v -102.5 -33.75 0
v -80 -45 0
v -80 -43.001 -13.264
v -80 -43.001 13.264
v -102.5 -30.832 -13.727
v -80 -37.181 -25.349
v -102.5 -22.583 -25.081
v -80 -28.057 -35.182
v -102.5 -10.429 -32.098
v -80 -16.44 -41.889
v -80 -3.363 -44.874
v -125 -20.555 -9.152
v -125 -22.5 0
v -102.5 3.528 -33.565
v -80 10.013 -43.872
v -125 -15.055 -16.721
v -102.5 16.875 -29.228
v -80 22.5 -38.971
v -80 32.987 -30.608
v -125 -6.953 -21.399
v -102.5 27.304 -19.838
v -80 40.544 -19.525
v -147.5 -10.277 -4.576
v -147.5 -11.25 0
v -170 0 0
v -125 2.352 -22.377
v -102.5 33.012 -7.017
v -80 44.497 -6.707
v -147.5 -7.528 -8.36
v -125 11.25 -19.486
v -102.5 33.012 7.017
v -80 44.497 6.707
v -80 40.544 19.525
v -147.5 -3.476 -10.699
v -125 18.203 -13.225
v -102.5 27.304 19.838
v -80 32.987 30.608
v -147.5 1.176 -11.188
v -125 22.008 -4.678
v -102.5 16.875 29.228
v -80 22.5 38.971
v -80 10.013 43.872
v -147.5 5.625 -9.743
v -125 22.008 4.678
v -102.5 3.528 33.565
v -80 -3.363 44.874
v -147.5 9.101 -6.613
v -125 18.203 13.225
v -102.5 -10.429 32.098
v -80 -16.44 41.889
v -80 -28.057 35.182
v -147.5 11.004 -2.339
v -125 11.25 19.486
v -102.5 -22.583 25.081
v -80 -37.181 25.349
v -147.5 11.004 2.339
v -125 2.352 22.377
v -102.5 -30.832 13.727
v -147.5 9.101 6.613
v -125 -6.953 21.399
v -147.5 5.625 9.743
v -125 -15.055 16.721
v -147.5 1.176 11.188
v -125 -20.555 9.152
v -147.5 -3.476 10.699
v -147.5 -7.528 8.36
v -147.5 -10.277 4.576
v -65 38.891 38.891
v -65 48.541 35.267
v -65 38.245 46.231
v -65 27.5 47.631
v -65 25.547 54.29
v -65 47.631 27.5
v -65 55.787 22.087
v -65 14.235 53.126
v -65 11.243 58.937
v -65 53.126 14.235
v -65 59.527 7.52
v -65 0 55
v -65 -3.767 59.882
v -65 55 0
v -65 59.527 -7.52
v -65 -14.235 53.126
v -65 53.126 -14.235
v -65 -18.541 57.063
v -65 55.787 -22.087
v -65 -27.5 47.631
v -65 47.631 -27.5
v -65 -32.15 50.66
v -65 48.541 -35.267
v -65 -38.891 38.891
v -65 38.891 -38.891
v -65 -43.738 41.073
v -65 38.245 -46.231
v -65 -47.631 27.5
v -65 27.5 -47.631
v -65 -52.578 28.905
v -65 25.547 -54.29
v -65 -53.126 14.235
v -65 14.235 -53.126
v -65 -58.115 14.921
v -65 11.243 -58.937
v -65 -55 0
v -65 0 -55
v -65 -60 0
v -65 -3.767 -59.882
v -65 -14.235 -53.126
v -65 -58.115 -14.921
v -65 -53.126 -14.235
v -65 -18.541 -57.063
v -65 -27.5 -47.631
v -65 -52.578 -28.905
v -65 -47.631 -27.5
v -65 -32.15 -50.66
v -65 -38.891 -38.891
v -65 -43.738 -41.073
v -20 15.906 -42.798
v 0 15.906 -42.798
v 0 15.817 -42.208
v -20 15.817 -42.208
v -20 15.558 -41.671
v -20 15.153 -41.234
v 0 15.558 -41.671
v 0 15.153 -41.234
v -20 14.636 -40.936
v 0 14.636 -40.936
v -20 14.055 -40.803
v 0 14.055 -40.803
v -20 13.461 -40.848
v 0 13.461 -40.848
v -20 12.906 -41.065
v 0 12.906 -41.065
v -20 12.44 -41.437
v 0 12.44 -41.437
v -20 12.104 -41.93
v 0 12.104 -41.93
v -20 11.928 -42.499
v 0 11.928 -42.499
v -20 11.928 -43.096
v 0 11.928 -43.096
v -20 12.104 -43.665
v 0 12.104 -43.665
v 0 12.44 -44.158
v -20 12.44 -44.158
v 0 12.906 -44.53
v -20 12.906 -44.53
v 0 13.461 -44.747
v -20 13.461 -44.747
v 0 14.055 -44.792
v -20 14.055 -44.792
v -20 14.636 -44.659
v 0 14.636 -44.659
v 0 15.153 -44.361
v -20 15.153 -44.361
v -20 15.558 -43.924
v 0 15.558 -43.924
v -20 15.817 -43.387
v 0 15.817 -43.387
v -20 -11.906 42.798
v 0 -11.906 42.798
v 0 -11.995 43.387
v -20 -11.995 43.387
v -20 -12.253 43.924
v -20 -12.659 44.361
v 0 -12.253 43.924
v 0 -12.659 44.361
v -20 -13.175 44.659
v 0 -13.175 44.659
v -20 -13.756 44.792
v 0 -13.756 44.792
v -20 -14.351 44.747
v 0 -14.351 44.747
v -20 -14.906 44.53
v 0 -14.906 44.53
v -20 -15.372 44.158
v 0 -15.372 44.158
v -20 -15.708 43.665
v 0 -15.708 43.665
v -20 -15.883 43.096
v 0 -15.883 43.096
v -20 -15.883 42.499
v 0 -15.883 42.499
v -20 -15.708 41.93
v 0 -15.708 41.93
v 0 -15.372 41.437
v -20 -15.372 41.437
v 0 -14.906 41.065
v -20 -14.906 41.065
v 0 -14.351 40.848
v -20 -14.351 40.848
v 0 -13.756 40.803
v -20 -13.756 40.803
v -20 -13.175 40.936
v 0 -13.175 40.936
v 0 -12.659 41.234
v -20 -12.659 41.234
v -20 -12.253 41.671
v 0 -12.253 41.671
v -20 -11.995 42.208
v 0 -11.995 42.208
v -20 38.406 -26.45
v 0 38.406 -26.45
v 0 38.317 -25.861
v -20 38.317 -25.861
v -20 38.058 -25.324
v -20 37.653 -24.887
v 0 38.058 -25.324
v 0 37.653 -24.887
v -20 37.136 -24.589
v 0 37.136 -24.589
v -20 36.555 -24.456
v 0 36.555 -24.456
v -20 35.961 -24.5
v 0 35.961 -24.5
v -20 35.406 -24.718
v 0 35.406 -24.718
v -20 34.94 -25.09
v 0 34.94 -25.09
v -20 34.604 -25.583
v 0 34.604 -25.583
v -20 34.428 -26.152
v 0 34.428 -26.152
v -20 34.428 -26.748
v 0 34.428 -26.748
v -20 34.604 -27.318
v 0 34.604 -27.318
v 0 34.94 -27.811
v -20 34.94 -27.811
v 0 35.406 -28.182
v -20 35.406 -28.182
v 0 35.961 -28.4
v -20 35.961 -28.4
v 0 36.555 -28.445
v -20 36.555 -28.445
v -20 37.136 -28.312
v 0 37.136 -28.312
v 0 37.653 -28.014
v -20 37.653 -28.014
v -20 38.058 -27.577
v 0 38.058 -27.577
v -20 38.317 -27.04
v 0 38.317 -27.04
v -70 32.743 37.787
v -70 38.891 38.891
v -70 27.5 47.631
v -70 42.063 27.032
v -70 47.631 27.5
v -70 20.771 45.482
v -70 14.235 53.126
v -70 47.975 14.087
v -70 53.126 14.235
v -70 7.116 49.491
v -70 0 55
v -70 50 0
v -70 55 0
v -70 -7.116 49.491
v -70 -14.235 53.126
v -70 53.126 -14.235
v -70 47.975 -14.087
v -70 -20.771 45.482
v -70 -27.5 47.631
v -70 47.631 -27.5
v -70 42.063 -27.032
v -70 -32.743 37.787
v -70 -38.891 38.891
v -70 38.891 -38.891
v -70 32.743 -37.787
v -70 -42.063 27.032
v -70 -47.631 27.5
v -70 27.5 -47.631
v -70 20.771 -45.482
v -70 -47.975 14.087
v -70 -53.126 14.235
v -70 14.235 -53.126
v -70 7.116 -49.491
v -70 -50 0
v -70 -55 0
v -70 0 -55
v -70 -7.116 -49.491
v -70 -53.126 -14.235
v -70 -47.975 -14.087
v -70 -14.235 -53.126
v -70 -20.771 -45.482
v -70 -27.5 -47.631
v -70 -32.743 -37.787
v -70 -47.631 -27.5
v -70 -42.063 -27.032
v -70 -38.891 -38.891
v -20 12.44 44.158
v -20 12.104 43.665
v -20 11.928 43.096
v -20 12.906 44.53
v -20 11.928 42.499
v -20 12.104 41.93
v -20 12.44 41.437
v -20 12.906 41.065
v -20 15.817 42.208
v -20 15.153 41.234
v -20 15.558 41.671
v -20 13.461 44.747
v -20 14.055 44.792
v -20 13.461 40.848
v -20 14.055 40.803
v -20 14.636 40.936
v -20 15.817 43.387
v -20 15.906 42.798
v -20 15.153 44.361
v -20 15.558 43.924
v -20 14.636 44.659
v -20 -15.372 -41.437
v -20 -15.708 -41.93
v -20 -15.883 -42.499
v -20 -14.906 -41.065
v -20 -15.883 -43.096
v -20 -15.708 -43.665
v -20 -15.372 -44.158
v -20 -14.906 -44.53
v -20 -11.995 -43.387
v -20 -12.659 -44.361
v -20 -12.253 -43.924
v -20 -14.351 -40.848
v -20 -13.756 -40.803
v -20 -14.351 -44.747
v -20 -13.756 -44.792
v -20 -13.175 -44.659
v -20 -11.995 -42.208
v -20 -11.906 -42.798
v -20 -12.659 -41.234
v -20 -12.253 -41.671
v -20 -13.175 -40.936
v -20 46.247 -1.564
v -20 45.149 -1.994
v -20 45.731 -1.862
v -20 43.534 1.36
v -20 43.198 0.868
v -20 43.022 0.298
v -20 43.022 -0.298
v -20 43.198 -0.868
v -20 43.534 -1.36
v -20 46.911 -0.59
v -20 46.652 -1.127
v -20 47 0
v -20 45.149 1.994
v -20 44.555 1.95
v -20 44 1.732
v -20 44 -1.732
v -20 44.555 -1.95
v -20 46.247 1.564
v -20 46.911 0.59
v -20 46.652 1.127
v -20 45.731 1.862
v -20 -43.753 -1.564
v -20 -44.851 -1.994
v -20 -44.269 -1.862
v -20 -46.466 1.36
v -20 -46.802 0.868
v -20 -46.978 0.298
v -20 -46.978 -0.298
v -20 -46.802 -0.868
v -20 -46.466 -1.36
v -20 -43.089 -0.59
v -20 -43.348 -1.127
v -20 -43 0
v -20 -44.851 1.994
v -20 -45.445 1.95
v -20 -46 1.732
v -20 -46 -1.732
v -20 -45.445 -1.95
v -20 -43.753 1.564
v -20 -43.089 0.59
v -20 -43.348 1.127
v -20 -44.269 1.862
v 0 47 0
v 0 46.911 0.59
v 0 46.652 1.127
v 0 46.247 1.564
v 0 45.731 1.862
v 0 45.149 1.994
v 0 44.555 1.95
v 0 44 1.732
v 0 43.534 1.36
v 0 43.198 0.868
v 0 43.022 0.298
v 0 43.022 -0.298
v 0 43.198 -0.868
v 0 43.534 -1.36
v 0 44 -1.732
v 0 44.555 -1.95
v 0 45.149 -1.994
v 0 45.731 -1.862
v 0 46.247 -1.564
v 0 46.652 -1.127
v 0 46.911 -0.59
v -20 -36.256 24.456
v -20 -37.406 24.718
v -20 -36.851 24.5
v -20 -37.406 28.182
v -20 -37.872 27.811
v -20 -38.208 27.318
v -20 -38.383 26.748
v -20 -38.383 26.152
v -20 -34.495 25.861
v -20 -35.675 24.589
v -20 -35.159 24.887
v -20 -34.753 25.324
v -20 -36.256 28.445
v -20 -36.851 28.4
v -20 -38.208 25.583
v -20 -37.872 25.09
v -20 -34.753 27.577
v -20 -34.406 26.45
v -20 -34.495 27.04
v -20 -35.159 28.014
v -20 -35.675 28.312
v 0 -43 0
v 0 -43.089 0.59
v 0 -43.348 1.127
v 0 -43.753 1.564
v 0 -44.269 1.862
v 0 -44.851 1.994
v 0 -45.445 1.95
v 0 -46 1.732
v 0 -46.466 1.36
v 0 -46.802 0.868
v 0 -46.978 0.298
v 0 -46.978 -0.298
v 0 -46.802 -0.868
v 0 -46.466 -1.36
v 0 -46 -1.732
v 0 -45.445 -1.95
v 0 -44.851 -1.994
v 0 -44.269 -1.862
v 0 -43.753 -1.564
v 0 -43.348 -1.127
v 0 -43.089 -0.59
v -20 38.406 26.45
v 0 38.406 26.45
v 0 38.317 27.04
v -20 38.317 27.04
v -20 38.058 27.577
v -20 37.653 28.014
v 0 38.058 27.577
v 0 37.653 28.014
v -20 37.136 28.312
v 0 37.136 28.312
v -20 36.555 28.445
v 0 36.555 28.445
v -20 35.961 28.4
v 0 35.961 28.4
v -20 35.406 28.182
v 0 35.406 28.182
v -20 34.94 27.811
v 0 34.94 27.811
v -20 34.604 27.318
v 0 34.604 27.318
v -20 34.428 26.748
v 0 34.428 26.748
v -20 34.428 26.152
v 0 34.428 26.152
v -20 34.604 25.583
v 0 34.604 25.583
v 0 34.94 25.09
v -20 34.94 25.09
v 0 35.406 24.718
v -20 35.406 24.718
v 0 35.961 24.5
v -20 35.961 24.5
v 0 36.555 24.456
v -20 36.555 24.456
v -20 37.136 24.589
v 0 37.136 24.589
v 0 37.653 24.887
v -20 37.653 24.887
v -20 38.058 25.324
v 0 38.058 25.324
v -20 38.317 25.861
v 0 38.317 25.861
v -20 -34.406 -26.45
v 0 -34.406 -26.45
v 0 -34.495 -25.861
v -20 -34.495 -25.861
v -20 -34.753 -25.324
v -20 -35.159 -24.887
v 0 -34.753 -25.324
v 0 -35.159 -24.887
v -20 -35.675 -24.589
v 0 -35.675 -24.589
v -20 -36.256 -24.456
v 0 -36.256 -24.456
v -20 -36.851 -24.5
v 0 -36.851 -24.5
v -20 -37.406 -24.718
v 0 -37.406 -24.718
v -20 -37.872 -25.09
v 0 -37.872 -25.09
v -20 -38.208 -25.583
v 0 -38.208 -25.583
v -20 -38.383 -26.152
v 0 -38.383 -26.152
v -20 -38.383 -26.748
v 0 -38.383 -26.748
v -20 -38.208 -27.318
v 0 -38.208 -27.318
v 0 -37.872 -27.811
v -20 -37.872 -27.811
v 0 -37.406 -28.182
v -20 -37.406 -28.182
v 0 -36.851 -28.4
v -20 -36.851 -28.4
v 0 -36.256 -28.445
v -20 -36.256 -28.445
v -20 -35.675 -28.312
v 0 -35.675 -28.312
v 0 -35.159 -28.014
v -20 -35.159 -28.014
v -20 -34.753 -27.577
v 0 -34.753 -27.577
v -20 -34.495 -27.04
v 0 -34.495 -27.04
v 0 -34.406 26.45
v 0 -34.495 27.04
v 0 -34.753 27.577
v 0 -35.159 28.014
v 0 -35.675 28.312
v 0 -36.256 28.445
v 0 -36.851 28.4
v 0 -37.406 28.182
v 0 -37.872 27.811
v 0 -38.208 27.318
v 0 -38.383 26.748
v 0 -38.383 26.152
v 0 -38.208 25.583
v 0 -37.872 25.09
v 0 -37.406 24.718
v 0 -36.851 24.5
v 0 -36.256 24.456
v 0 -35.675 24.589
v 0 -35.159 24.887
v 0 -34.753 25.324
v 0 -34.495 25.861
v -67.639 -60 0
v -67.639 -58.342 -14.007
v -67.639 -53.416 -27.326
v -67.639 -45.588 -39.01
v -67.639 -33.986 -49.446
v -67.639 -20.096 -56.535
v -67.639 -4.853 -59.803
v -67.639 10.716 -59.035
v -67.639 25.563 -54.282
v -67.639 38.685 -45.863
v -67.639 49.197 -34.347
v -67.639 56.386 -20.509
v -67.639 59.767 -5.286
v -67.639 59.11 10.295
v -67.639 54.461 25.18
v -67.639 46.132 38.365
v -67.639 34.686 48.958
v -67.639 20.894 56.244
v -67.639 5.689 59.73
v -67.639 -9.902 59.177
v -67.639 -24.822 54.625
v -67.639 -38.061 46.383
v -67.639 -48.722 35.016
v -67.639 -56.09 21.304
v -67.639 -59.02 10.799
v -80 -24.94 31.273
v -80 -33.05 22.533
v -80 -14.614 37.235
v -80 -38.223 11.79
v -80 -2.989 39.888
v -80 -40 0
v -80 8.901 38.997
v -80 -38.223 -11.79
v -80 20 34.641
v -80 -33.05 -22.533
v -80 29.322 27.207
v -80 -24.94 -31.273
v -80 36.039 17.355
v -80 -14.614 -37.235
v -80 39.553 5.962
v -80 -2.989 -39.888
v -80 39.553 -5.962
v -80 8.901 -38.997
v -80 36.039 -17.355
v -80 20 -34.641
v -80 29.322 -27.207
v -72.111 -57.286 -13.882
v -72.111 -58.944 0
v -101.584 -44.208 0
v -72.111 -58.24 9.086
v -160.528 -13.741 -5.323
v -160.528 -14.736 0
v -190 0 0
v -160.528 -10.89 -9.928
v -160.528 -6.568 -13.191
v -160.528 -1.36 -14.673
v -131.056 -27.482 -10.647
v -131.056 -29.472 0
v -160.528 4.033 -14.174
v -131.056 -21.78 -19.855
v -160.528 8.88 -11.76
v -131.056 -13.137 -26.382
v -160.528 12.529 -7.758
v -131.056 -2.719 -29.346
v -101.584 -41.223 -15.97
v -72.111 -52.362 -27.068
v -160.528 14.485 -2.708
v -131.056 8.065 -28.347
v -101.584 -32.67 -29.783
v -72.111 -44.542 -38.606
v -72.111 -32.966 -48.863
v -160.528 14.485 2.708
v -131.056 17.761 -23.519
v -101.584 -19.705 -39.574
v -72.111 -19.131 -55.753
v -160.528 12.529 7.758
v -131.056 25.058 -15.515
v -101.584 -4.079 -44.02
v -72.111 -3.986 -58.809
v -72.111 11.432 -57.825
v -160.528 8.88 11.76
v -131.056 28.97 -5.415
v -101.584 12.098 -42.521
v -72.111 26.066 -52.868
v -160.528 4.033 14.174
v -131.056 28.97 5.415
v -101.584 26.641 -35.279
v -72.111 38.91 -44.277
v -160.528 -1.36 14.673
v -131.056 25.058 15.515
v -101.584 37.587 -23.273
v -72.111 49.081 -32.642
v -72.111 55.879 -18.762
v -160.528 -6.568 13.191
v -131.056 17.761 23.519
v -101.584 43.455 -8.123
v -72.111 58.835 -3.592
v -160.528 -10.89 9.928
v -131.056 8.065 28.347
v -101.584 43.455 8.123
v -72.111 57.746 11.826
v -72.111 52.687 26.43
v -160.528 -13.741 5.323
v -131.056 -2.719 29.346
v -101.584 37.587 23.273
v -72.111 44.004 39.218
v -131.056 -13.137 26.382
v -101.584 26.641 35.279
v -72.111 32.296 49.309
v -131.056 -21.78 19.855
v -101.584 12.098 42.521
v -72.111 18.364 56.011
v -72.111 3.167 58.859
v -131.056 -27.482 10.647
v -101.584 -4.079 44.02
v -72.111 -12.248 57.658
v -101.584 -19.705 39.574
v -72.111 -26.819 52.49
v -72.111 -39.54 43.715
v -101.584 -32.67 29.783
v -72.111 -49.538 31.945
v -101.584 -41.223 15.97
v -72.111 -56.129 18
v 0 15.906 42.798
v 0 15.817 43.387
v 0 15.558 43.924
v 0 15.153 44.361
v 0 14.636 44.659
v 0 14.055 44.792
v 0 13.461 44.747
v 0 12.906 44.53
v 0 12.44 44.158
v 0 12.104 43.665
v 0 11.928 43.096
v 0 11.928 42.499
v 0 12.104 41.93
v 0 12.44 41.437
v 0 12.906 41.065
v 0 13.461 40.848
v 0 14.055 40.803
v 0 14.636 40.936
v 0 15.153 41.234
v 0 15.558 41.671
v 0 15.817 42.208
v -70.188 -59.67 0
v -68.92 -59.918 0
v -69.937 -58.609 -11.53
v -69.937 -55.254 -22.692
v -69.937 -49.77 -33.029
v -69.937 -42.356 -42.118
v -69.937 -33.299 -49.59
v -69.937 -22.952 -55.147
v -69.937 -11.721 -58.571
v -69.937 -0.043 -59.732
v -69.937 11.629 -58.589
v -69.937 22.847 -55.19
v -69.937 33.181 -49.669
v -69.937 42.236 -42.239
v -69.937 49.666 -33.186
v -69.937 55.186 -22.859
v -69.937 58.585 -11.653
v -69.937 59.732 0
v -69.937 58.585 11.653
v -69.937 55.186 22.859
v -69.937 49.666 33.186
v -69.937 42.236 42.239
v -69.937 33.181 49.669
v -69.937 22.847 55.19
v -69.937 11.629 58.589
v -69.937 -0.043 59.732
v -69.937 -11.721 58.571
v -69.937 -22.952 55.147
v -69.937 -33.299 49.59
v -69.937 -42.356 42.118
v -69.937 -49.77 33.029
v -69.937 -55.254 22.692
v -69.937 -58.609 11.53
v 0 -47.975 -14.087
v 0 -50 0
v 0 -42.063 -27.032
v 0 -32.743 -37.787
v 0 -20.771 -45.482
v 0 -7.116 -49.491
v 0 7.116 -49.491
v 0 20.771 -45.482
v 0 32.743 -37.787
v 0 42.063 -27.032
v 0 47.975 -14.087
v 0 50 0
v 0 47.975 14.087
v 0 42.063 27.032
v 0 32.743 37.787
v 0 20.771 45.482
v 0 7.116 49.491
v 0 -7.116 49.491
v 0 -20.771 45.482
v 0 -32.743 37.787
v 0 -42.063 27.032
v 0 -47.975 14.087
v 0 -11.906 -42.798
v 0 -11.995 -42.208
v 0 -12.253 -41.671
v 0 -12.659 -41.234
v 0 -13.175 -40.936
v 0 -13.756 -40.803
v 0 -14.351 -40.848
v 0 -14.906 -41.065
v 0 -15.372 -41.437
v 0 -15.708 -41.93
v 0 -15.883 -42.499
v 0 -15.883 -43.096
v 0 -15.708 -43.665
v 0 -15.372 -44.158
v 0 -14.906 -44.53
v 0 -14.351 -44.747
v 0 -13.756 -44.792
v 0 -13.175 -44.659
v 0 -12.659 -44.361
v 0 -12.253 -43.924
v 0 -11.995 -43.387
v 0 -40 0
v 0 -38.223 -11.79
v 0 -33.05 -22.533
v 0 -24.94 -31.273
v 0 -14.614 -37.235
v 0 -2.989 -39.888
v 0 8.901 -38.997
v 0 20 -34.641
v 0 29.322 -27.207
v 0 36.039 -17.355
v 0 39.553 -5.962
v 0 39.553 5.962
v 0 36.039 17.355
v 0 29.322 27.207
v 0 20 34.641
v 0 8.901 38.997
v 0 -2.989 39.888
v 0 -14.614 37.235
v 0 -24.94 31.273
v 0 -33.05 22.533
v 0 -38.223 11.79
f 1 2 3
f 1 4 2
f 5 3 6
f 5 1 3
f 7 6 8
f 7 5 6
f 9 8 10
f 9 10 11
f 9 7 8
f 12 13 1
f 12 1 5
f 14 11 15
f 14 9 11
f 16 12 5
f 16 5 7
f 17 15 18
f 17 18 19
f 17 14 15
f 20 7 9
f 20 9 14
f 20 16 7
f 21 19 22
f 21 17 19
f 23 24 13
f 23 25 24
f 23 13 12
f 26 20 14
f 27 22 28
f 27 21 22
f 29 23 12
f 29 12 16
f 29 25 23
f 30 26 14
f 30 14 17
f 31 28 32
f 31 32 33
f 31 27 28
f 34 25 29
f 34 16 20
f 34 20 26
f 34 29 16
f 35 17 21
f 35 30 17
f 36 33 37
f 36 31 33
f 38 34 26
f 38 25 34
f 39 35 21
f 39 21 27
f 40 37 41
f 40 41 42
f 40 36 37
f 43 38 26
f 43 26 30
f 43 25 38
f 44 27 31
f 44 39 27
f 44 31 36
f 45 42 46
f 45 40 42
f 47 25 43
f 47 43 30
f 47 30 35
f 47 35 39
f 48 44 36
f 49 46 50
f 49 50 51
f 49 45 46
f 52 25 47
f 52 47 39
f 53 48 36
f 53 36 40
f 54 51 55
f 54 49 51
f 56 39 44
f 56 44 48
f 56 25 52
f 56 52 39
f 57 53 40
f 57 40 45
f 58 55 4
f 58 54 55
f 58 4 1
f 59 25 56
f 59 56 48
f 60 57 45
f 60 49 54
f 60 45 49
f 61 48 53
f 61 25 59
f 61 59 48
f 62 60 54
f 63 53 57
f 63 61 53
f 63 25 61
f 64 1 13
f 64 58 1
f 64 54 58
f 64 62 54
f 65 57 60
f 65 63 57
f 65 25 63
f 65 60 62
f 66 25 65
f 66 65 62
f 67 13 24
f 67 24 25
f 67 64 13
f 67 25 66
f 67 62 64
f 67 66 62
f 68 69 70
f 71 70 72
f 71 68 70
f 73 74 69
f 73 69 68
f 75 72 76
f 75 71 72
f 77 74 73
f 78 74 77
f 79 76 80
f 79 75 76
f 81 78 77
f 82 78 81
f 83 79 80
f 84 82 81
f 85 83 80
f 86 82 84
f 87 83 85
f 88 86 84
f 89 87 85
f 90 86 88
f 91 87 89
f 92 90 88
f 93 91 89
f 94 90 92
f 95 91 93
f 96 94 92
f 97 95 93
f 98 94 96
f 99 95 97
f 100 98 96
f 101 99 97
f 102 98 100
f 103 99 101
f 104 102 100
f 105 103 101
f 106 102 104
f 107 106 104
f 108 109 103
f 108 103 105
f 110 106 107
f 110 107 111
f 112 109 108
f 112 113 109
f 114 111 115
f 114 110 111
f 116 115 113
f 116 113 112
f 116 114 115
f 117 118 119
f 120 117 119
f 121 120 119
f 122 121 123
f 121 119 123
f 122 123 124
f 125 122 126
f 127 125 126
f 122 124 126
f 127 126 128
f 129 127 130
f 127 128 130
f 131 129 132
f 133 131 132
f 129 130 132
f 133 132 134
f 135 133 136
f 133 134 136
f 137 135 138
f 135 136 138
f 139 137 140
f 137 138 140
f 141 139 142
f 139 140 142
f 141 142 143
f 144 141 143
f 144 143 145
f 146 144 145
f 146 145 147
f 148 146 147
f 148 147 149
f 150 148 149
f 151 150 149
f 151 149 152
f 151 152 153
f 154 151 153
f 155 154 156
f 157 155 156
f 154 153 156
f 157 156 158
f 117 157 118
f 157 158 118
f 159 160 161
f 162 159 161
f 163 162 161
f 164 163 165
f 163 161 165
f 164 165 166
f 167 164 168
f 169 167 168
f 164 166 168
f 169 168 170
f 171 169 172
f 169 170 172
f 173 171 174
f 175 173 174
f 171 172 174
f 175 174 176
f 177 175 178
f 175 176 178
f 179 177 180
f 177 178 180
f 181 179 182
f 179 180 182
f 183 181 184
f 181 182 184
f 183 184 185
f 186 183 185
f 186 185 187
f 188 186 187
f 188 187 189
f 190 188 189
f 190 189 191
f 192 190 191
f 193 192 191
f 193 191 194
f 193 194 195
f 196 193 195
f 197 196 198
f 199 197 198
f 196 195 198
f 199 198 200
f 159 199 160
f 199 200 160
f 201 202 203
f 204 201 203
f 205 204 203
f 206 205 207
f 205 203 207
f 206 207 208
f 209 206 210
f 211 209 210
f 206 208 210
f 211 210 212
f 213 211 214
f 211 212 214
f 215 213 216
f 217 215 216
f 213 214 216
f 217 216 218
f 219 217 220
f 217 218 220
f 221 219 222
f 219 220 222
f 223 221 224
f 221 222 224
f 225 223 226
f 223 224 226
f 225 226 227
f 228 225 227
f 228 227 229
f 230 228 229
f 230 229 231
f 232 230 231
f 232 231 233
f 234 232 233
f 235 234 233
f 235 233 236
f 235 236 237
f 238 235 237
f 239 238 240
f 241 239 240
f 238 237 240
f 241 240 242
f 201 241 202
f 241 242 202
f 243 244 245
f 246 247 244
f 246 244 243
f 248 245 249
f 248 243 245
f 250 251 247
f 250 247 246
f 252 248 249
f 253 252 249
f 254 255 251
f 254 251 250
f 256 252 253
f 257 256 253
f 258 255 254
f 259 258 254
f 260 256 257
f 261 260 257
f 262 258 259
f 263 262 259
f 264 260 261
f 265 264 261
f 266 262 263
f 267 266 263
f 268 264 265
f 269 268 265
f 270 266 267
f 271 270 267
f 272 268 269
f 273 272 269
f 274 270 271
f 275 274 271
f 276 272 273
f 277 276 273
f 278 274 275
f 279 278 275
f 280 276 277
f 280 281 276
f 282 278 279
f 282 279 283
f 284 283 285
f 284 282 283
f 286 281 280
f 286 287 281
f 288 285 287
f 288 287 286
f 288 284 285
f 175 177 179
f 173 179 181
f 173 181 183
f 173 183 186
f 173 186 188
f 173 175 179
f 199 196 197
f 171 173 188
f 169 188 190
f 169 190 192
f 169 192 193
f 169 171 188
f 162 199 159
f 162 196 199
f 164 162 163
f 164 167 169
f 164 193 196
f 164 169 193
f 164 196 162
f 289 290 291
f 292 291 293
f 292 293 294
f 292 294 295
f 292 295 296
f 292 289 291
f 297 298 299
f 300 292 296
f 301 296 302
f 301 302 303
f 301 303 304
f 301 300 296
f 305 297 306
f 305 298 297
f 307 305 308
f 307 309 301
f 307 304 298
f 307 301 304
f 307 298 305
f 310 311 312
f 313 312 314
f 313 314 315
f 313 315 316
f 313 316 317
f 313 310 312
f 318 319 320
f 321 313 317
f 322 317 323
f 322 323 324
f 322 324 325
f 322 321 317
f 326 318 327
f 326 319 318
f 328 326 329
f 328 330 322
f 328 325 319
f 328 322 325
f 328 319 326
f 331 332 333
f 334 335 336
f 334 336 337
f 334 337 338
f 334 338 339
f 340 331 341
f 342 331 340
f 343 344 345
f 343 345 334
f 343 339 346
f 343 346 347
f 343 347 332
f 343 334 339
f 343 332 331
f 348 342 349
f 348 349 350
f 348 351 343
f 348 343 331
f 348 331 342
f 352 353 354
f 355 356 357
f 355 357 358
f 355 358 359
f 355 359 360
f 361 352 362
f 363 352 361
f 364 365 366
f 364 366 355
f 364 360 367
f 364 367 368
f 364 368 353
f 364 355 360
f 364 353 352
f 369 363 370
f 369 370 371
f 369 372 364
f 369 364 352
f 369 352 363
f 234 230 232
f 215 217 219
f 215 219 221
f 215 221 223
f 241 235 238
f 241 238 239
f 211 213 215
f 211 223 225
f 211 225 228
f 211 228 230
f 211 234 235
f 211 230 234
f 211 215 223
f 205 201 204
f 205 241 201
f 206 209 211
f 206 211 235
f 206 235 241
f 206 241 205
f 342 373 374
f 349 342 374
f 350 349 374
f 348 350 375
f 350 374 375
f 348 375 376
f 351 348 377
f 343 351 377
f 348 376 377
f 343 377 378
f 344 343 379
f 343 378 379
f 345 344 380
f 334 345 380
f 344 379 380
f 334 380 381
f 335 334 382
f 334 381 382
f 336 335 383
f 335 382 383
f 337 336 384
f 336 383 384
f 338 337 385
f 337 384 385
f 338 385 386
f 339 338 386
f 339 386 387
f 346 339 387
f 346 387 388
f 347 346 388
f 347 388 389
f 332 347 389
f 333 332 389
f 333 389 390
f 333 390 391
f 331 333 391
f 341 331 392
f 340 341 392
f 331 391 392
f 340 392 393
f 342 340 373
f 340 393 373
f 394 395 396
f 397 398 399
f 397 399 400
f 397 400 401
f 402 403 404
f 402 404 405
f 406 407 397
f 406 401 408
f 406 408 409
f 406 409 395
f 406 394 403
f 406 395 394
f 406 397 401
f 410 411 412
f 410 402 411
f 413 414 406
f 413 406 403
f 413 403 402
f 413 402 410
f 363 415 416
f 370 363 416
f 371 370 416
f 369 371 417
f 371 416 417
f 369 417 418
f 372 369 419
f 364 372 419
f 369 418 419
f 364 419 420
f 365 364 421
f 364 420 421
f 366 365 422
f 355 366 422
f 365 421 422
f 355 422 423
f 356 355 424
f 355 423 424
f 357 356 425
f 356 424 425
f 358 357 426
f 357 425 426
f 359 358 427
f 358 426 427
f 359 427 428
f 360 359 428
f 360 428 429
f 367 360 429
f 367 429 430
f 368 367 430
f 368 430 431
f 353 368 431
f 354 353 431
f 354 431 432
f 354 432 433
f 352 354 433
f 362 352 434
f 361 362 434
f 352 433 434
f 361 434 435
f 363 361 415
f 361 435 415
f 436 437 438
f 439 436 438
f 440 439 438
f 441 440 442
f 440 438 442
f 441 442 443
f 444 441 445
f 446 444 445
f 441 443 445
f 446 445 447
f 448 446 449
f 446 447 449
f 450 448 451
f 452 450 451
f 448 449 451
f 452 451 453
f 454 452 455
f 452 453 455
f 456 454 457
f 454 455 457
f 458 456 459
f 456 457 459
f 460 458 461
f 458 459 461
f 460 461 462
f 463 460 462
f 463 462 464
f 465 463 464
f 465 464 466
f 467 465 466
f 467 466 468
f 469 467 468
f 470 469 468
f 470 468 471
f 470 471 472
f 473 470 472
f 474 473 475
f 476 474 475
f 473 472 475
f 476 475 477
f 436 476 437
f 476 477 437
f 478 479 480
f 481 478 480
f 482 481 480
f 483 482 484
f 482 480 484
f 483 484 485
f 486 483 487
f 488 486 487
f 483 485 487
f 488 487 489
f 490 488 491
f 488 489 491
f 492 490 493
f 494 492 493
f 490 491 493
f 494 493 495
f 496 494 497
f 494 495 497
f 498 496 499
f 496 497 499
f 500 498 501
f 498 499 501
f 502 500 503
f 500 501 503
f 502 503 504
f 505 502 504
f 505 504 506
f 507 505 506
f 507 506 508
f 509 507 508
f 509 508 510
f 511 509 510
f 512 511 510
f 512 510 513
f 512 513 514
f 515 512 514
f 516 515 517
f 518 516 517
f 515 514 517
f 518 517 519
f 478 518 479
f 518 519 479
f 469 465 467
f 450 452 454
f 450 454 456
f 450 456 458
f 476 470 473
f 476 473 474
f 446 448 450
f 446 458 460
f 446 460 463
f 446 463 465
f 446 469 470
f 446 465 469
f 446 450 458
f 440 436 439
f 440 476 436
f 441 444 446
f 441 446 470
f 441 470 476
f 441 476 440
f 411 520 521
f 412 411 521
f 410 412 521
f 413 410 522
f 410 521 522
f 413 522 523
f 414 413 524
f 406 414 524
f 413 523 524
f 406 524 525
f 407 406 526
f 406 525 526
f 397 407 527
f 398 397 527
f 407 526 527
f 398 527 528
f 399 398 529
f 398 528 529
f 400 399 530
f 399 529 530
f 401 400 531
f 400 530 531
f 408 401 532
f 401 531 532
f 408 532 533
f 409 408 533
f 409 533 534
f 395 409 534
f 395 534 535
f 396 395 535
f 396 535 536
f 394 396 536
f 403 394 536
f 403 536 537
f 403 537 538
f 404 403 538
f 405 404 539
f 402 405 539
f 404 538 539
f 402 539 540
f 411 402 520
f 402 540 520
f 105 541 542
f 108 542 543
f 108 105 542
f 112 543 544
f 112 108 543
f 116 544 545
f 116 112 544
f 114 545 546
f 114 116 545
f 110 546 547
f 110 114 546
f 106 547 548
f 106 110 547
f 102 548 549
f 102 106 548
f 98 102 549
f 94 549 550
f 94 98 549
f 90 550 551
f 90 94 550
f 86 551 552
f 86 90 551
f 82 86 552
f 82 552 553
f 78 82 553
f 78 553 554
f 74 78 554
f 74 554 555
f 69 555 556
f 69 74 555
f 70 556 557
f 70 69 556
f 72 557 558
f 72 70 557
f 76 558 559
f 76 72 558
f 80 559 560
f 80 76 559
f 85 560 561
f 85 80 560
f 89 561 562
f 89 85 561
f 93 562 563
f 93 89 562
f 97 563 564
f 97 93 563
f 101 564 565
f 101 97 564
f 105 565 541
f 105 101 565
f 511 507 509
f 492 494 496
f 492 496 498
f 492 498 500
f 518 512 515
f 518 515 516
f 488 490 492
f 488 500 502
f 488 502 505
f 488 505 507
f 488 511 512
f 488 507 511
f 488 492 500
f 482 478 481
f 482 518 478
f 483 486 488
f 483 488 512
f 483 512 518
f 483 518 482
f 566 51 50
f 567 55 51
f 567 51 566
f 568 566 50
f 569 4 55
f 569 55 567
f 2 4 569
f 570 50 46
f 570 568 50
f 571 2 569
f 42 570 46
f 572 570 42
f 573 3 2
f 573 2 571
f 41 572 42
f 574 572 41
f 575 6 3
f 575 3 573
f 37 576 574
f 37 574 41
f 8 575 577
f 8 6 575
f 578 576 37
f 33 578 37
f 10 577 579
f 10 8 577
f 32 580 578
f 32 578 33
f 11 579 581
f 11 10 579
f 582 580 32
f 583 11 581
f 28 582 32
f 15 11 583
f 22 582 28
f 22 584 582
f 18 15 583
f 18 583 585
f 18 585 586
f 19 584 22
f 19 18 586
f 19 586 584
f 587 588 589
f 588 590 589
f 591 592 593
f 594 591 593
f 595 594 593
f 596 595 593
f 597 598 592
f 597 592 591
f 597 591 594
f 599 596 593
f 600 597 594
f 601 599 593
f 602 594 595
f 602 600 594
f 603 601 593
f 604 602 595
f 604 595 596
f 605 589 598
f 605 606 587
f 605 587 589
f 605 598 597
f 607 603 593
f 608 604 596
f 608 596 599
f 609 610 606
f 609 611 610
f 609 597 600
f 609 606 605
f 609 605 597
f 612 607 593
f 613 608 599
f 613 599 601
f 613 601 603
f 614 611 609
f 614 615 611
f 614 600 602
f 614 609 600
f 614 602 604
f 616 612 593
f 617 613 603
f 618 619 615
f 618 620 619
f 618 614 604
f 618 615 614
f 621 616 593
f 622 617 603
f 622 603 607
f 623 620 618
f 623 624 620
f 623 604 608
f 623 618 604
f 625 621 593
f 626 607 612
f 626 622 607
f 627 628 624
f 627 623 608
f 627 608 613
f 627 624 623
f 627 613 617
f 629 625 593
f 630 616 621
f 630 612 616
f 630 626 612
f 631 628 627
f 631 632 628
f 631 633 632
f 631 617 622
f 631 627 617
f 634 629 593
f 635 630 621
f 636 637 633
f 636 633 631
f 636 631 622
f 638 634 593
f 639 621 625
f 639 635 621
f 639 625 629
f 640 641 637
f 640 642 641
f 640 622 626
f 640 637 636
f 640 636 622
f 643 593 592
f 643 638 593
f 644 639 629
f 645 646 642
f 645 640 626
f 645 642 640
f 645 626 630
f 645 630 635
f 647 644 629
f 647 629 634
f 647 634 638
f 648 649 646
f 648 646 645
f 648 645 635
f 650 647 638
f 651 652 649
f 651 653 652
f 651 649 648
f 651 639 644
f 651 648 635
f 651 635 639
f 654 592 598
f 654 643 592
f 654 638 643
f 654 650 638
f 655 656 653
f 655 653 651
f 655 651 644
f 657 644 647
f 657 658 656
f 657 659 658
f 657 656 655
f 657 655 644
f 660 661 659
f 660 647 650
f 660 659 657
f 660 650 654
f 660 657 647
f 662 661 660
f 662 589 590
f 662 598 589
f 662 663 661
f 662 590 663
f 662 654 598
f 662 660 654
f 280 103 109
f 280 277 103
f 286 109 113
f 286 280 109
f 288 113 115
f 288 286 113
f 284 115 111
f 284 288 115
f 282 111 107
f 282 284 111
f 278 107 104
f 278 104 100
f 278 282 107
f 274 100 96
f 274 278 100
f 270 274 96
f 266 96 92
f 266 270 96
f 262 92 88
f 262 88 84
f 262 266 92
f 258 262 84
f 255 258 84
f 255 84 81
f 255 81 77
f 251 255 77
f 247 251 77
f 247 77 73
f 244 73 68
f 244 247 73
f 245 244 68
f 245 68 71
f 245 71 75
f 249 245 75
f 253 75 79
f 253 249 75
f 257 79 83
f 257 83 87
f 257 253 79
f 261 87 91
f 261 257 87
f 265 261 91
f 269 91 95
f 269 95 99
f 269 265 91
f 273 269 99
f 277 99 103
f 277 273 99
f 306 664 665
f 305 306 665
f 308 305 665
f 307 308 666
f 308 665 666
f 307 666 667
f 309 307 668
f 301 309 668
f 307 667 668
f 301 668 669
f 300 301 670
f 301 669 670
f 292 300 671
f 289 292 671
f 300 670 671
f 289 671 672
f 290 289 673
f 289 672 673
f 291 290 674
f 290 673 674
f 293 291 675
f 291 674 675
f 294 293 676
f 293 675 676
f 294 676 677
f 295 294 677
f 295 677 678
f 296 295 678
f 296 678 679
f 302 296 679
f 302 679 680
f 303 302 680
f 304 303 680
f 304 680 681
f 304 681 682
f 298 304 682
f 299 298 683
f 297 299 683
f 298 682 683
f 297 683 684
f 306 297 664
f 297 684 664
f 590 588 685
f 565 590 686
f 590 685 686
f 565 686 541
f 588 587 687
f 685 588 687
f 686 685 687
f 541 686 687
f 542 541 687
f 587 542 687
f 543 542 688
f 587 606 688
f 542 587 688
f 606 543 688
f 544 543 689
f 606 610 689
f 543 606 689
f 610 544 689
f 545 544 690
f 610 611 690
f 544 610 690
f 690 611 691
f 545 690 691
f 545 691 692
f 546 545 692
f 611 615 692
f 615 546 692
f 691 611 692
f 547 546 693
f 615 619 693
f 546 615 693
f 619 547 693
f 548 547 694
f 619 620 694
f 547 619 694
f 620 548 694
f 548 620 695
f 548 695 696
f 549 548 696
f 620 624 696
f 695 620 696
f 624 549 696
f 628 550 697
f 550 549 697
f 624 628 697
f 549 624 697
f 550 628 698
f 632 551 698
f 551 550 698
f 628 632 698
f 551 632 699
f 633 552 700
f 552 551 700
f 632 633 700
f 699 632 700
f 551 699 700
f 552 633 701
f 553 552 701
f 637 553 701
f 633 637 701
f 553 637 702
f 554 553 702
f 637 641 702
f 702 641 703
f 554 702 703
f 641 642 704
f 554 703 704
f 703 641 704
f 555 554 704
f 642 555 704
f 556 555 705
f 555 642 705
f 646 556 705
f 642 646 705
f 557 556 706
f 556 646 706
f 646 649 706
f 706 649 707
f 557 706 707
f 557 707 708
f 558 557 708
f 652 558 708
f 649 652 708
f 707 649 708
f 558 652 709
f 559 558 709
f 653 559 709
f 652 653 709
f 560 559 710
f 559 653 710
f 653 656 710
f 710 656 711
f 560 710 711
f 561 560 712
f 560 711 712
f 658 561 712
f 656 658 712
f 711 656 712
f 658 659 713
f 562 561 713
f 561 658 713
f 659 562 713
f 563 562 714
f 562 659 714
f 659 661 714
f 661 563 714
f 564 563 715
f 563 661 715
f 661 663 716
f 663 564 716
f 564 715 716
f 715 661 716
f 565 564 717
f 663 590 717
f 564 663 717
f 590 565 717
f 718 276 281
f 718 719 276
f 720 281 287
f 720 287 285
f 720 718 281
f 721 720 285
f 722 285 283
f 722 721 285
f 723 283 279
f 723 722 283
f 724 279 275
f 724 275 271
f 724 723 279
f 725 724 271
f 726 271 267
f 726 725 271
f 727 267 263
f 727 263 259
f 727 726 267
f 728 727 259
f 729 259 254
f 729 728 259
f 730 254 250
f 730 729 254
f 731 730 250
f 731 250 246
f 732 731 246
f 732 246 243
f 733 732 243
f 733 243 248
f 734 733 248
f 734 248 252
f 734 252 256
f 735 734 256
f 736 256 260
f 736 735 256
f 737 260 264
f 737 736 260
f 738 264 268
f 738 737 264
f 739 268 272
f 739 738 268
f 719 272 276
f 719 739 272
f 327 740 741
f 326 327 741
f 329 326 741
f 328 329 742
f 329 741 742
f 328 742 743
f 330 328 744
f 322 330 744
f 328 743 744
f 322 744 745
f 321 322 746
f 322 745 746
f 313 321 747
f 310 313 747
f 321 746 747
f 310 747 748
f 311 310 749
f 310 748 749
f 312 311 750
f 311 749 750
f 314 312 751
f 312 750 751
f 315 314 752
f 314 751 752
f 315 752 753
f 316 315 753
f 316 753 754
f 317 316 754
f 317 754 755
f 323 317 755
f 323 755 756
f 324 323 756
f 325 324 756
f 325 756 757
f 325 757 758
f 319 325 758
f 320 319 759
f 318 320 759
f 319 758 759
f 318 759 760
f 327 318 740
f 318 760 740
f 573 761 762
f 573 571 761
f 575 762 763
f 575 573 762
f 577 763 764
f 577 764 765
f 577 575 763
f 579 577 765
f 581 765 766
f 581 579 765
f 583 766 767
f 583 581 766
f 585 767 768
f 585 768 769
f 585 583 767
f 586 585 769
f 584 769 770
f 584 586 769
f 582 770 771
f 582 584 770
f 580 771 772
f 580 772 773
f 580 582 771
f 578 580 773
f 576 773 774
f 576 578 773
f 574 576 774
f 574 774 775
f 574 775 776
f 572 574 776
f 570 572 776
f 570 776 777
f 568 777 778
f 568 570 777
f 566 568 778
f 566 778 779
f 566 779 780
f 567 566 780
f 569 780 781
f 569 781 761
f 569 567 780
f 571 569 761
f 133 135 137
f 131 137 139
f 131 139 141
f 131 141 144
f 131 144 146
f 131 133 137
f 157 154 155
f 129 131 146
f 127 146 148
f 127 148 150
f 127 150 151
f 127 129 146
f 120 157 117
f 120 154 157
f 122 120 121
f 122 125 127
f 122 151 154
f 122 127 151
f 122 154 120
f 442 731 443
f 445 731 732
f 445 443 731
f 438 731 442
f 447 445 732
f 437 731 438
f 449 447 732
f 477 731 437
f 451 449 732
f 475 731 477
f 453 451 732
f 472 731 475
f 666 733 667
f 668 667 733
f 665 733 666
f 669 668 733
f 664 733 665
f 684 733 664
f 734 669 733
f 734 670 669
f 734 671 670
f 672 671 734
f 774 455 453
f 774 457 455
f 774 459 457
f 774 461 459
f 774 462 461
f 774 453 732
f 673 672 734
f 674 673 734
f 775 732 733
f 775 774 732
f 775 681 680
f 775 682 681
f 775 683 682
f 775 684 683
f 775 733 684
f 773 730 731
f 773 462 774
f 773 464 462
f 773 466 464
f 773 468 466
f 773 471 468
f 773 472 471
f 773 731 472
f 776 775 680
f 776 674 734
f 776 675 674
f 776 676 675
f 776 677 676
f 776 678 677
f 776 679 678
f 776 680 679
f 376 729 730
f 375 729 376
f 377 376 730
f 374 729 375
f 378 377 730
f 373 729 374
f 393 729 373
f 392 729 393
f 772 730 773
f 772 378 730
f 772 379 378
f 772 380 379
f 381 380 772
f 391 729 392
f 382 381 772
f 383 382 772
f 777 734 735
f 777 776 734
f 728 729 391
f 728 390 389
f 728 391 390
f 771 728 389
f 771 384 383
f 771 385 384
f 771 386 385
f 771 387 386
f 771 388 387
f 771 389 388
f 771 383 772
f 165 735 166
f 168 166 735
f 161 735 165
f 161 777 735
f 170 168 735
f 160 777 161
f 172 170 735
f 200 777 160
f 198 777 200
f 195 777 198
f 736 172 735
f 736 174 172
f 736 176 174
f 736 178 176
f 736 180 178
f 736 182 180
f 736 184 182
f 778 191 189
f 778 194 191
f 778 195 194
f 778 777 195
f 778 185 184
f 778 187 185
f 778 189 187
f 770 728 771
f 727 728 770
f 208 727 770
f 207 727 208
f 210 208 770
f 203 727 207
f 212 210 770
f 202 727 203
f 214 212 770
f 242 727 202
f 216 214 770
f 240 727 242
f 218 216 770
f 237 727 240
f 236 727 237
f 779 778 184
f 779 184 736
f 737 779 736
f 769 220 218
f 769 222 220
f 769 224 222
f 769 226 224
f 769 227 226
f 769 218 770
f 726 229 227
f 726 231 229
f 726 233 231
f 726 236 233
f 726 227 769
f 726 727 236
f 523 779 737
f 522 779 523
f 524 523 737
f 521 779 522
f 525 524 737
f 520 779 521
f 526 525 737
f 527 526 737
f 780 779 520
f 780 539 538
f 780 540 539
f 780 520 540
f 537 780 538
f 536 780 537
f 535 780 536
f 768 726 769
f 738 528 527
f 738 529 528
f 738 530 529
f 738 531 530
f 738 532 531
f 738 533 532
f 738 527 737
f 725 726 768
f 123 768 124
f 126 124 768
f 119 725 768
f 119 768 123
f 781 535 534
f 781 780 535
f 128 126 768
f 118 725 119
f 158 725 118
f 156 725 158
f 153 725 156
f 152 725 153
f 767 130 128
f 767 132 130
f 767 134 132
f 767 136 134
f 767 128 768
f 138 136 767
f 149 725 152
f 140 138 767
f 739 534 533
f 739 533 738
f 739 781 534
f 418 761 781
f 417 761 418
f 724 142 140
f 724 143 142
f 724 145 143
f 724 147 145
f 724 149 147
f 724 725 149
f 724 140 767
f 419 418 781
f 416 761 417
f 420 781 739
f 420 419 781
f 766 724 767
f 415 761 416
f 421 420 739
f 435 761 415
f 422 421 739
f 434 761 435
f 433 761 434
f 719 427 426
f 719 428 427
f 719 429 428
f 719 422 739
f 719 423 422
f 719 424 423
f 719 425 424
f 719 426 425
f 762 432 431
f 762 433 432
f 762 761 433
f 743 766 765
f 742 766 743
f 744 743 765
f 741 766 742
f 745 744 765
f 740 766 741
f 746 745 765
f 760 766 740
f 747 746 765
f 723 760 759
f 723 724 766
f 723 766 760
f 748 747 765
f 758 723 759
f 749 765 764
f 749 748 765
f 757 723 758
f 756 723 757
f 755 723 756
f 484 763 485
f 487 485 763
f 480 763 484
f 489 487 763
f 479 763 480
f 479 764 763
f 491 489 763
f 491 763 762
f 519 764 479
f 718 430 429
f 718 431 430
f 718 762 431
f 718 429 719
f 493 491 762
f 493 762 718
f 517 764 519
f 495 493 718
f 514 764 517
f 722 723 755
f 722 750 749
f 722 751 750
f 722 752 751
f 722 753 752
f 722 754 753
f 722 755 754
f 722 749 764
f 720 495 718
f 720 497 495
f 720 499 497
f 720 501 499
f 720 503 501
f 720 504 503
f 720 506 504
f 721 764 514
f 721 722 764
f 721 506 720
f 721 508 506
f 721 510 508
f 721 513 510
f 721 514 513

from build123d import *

# Parameters (mm, degrees)
SKETCH2_R          = 2
CUT_EXTRUDE1_DEPTH = 20
FILLET1_R          = 10


with BuildPart() as part:
    # Sketch1 → Revolve1 (revolve)
    with BuildSketch(Plane.XY, mode=Mode.PRIVATE) as revolve1_sk:
        Polygon((-170, 0), (-190, 0), (-70, 60), (-65, 60), (-65, 55), (-70, 55), (-70, 50), (0, 50), (0, 40), (-80, 40), (-80, 45), align=None)
    revolve(revolve1_sk.sketch.rotate(Axis((-170, 0, 0), (1, 0, 0)), 180), axis=Axis((-170, 0, 0), (1, 0, 0)))

    # Sketch2 → Cut-Extrude1 (cut)
    with BuildSketch(Plane(origin=(0, 0, 0), x_dir=(0, 0, -1), z_dir=(1, 0, 0))):
        with Locations(Location((0, 45, 0), (0, 0, 90))):
            Circle(SKETCH2_R)
        with Locations(Location((26.450336353, 36.405764747, 0), (0, 0, 90))):
            Circle(SKETCH2_R)
        with Locations(Location((42.797543233, 13.905764747, 0), (0, 0, 90))):
            Circle(SKETCH2_R)
        with Locations(Location((42.797543233, -13.905764747, 0), (0, 0, 90))):
            Circle(SKETCH2_R)
        with Locations(Location((26.450336353, -36.405764747, 0), (0, 0, 90))):
            Circle(SKETCH2_R)
        with Locations(Location((0, -45, 0), (0, 0, 90))):
            Circle(SKETCH2_R)
        with Locations(Location((-26.450336353, -36.405764747, 0), (0, 0, 90))):
            Circle(SKETCH2_R)
        with Locations(Location((-42.797543233, -13.905764747, 0), (0, 0, 90))):
            Circle(SKETCH2_R)
        with Locations(Location((-42.797543233, 13.905764747, 0), (0, 0, 90))):
            Circle(SKETCH2_R)
        with Locations(Location((-26.450336353, 36.405764747, 0), (0, 0, 90))):
            Circle(SKETCH2_R)
    extrude(amount=-CUT_EXTRUDE1_DEPTH, mode=Mode.SUBTRACT)

    # Fillet1
    fillet1_edges = [part.edges().sort_by_distance(p)[0] for p in [
        (-70, 60, 0),
    ]]
    fillet(fillet1_edges, radius=FILLET1_R)


solid = part.part
